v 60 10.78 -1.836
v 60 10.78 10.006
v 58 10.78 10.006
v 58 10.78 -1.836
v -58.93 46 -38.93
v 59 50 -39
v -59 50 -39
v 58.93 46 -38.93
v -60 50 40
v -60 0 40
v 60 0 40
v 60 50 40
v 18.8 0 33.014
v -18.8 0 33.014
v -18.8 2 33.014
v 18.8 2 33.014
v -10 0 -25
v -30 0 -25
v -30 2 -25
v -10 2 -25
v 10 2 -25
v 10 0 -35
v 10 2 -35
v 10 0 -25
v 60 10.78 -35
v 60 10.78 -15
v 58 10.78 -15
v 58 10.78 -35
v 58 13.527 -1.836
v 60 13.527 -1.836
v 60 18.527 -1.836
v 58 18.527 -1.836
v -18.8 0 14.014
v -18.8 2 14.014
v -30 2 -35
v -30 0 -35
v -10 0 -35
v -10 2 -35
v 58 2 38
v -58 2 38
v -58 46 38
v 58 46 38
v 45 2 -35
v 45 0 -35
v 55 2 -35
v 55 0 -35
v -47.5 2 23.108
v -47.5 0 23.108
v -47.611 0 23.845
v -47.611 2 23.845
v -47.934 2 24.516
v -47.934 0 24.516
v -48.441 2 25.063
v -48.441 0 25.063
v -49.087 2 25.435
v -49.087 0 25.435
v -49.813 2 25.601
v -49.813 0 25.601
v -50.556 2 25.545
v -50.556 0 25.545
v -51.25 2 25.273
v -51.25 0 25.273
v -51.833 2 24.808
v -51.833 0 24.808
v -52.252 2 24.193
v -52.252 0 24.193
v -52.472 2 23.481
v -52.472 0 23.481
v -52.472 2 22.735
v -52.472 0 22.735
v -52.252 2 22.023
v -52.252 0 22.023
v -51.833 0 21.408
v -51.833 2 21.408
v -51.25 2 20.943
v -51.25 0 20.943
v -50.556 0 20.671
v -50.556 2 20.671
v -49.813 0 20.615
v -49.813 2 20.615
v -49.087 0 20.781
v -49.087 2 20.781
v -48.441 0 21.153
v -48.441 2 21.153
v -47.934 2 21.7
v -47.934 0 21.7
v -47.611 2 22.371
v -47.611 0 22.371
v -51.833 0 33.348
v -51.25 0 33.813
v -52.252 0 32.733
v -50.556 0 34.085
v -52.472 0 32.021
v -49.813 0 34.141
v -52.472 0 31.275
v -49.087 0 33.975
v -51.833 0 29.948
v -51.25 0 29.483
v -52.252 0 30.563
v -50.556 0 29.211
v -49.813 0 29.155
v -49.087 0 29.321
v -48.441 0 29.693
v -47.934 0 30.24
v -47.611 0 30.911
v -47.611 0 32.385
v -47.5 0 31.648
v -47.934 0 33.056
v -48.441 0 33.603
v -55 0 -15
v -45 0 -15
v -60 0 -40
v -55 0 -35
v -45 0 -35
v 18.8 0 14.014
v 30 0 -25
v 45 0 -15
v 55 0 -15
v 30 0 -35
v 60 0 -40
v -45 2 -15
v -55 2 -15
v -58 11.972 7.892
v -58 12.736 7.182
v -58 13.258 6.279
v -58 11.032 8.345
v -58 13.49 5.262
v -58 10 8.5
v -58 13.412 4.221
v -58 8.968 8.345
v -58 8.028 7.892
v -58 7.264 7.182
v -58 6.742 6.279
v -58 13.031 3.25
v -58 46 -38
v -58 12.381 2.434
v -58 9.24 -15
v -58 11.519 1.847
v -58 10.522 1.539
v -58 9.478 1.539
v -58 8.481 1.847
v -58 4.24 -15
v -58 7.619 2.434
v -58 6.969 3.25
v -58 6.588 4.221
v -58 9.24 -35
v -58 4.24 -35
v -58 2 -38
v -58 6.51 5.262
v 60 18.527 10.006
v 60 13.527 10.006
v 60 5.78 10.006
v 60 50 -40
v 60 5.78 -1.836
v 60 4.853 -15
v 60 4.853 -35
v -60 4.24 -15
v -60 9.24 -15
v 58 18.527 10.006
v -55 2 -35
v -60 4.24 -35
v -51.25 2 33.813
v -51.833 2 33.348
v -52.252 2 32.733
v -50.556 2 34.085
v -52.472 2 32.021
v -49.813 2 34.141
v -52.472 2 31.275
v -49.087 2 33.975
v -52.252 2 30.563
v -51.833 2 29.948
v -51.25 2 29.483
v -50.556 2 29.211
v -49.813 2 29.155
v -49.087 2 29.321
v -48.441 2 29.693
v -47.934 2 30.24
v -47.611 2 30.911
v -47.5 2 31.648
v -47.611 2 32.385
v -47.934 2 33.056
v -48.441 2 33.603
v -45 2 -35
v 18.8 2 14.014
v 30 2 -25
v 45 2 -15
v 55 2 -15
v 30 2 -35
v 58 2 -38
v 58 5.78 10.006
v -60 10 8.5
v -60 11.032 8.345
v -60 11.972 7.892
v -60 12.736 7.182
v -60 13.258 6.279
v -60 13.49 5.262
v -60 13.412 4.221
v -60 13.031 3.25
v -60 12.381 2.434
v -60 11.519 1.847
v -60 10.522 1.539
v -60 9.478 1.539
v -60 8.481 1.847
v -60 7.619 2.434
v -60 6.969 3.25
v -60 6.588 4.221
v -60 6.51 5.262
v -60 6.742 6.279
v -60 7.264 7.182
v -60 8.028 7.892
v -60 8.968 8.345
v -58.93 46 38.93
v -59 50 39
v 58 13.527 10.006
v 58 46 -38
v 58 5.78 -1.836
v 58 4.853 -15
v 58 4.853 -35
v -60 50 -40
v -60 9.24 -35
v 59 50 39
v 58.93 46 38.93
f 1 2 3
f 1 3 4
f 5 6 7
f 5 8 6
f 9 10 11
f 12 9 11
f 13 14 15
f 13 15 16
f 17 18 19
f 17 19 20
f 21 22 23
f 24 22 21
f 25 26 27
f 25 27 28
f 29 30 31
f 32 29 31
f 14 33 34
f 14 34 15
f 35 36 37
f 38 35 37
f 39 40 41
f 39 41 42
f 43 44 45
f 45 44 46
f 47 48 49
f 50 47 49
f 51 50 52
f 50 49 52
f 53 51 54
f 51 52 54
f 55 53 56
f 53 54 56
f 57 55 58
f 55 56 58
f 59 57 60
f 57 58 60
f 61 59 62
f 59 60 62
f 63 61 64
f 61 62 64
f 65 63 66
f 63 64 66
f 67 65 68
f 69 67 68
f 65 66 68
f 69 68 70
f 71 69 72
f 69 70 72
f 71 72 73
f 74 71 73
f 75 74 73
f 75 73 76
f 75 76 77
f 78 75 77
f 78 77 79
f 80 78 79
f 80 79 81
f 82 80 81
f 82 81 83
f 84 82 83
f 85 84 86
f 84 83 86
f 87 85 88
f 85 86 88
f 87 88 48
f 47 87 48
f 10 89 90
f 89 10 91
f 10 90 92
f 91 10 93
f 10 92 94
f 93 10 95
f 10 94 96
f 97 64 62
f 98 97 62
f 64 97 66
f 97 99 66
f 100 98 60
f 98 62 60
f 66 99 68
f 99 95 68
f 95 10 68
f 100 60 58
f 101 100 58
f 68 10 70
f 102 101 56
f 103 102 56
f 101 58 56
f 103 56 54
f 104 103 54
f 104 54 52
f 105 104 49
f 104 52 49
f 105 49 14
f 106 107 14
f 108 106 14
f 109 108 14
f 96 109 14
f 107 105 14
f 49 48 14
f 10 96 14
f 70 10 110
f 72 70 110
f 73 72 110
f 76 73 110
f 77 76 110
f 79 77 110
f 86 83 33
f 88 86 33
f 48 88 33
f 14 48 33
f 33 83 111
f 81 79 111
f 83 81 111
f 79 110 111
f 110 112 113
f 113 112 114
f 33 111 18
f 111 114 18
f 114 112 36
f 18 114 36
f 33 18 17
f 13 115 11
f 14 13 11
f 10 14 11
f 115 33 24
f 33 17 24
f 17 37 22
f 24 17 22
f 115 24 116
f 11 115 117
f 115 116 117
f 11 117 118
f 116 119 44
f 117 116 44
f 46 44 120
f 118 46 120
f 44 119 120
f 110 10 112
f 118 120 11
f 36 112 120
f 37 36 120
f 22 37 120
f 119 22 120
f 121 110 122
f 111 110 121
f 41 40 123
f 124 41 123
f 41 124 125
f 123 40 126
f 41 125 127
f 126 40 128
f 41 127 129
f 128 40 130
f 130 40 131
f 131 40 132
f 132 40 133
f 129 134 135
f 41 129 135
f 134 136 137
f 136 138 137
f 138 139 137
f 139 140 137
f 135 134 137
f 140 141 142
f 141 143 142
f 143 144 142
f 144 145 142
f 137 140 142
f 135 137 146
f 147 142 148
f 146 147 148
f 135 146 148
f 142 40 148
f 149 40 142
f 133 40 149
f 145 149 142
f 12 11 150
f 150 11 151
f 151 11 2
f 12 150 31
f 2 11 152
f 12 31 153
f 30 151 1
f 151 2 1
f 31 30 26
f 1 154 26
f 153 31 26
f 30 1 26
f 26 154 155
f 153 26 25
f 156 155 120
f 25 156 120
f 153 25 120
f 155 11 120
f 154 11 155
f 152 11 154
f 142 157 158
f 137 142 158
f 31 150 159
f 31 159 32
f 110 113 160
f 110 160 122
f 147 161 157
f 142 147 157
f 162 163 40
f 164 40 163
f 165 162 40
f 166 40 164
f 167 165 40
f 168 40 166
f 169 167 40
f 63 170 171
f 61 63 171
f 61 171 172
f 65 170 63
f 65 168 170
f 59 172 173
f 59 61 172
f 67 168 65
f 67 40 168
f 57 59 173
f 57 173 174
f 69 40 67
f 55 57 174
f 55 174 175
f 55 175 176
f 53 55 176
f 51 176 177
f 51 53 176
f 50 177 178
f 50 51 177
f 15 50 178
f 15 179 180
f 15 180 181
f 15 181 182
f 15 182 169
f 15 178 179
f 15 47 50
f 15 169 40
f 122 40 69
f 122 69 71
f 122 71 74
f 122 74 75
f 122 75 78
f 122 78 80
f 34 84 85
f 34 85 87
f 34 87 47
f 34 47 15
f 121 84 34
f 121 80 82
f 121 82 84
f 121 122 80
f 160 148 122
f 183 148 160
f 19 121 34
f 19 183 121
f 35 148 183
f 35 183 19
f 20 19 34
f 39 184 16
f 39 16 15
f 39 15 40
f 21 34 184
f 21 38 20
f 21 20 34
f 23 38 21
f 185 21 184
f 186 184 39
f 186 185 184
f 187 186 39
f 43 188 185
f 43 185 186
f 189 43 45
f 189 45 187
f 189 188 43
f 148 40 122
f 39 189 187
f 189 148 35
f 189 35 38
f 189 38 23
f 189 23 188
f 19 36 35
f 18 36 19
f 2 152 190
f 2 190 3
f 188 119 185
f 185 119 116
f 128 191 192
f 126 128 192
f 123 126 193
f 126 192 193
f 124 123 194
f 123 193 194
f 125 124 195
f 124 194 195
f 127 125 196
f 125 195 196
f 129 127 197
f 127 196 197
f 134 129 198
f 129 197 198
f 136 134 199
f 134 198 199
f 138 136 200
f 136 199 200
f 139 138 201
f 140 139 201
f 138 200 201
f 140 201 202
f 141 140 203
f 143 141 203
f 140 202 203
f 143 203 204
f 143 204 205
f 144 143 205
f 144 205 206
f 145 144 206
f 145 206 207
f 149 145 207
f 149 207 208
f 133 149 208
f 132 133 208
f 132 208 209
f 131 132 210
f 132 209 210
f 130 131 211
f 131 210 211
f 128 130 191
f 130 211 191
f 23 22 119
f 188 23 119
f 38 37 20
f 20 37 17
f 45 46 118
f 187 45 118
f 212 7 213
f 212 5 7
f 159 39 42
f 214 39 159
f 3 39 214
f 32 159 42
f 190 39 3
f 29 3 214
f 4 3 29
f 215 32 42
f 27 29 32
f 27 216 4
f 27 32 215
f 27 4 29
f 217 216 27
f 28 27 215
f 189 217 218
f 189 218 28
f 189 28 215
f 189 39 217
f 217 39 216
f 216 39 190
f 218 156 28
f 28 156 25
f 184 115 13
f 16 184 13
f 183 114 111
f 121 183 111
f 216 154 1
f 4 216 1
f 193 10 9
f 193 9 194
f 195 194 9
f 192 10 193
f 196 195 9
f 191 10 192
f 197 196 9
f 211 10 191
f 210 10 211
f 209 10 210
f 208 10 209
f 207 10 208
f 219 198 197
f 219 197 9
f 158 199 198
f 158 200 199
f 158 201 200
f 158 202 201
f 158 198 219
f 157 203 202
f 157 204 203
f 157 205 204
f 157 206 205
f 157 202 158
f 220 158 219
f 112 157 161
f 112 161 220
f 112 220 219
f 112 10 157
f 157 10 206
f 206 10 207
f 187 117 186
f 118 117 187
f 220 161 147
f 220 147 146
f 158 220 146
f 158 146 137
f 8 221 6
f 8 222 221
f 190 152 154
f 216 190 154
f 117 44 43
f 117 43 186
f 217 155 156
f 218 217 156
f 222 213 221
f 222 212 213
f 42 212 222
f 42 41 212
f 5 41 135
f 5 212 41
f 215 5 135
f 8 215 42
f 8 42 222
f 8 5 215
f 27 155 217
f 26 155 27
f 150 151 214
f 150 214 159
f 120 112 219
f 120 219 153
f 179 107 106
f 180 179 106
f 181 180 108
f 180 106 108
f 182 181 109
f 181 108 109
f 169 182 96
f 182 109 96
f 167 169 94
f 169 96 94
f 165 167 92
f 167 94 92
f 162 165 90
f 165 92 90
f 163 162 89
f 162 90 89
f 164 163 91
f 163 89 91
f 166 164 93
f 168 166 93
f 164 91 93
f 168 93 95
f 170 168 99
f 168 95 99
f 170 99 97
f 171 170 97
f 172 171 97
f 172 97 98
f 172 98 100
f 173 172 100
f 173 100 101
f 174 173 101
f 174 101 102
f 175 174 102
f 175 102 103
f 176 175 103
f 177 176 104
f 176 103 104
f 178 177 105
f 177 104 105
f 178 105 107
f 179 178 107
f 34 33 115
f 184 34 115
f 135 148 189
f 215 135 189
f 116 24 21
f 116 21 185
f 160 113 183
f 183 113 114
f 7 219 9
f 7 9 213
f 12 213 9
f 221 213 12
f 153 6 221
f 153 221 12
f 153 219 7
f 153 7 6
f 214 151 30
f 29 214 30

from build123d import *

# Parameters (mm, degrees)
SKETCH1_W           = 120
SKETCH1_H           = 80
BOSS_EXTRUDE1_DEPTH = 50
SHELL1_T            = -2
SKETCH3_R           = 2.5
SKETCH3_W           = 37.6
SKETCH3_H           = 19
SKETCH3_W_2         = 10
SKETCH3_H_2         = 20
SKETCH3_W_3         = 20
SKETCH3_H_3         = 10
CUT_EXTRUDE1_DEPTH  = 2
SKETCH4_R           = 3.5
SKETCH4_W           = 20
SKETCH4_H           = 5
CUT_EXTRUDE2_DEPTH  = 2
SKETCH5_W           = 118
SKETCH5_H           = 78
CUT_EXTRUDE3_DEPTH  = 4
CUT_EXTRUDE3_TAPER  = 1
SKETCH6_W           = 11.841510552
SKETCH6_H           = 5
SKETCH6_W_2         = 20
SKETCH6_H_2         = 5.927680675
CUT_EXTRUDE4_DEPTH  = 4


with BuildPart() as part:
    # Sketch1 → Boss-Extrude1 (new body)
    with BuildSketch(Plane(origin=(0, 0, 0), x_dir=(1, 0, 0), z_dir=(0, 1, 0))):
        Rectangle(SKETCH1_W, SKETCH1_H)
    extrude(amount=BOSS_EXTRUDE1_DEPTH)

    # Shell1
    shell1_openings = [part.faces().sort_by_distance(p)[0] for p in [
        (0, 50, 0),
    ]]
    offset(amount=SHELL1_T, openings=shell1_openings, kind=Kind.INTERSECTION)

    # Sketch3 → Cut-Extrude1 (cut)
    with BuildSketch(Plane.XZ):
        with Locations((-50, 31.648007145)):
            Circle(SKETCH3_R)
        with Locations((-50, 23.107977616)):
            Circle(SKETCH3_R)
        with Locations((0, 23.513536142)):
            Rectangle(SKETCH3_W, SKETCH3_H)
        with Locations((-50, -25)):
            Rectangle(SKETCH3_W_2, SKETCH3_H_2)
        with Locations((20, -30)):
            Rectangle(SKETCH3_W_3, SKETCH3_H_3)
        with Locations((-20, -30)):
            Rectangle(SKETCH3_W_3, SKETCH3_H_3)
        with Locations((50, -25)):
            Rectangle(SKETCH3_W_2, SKETCH3_H_2)
    extrude(amount=-CUT_EXTRUDE1_DEPTH, mode=Mode.SUBTRACT)

    # Sketch4 → Cut-Extrude2 (cut)
    with BuildSketch(Plane.ZY.offset(60)):
        with Locations((5, 10)):
            Circle(SKETCH4_R)
        with Locations((-25, 6.740257278)):
            Rectangle(SKETCH4_W, SKETCH4_H)
    extrude(amount=-CUT_EXTRUDE2_DEPTH, mode=Mode.SUBTRACT)

    # Sketch5 → Cut-Extrude3 (cut)
    with BuildSketch(Plane(origin=(0, 50, 0), x_dir=(1, 0, 0), z_dir=(0, 1, 0))):
        Rectangle(SKETCH5_W, SKETCH5_H)
    extrude(amount=-CUT_EXTRUDE3_DEPTH, taper=CUT_EXTRUDE3_TAPER, mode=Mode.SUBTRACT)

    # Sketch6 → Cut-Extrude4 (cut)
    with BuildSketch(Plane(origin=(60, 0, 0), x_dir=(0, 0, -1), z_dir=(1, 0, 0))):
        with Locations((-4.084800513, 8.280260813)):
            Rectangle(SKETCH6_W, SKETCH6_H)
        with Locations((-4.084800513, 16.026907298)):
            Rectangle(SKETCH6_W, SKETCH6_H)
        with Locations((25, 7.816420476)):
            Rectangle(SKETCH6_W_2, SKETCH6_H_2)
    extrude(amount=-CUT_EXTRUDE4_DEPTH, mode=Mode.SUBTRACT)


solid = part.part
